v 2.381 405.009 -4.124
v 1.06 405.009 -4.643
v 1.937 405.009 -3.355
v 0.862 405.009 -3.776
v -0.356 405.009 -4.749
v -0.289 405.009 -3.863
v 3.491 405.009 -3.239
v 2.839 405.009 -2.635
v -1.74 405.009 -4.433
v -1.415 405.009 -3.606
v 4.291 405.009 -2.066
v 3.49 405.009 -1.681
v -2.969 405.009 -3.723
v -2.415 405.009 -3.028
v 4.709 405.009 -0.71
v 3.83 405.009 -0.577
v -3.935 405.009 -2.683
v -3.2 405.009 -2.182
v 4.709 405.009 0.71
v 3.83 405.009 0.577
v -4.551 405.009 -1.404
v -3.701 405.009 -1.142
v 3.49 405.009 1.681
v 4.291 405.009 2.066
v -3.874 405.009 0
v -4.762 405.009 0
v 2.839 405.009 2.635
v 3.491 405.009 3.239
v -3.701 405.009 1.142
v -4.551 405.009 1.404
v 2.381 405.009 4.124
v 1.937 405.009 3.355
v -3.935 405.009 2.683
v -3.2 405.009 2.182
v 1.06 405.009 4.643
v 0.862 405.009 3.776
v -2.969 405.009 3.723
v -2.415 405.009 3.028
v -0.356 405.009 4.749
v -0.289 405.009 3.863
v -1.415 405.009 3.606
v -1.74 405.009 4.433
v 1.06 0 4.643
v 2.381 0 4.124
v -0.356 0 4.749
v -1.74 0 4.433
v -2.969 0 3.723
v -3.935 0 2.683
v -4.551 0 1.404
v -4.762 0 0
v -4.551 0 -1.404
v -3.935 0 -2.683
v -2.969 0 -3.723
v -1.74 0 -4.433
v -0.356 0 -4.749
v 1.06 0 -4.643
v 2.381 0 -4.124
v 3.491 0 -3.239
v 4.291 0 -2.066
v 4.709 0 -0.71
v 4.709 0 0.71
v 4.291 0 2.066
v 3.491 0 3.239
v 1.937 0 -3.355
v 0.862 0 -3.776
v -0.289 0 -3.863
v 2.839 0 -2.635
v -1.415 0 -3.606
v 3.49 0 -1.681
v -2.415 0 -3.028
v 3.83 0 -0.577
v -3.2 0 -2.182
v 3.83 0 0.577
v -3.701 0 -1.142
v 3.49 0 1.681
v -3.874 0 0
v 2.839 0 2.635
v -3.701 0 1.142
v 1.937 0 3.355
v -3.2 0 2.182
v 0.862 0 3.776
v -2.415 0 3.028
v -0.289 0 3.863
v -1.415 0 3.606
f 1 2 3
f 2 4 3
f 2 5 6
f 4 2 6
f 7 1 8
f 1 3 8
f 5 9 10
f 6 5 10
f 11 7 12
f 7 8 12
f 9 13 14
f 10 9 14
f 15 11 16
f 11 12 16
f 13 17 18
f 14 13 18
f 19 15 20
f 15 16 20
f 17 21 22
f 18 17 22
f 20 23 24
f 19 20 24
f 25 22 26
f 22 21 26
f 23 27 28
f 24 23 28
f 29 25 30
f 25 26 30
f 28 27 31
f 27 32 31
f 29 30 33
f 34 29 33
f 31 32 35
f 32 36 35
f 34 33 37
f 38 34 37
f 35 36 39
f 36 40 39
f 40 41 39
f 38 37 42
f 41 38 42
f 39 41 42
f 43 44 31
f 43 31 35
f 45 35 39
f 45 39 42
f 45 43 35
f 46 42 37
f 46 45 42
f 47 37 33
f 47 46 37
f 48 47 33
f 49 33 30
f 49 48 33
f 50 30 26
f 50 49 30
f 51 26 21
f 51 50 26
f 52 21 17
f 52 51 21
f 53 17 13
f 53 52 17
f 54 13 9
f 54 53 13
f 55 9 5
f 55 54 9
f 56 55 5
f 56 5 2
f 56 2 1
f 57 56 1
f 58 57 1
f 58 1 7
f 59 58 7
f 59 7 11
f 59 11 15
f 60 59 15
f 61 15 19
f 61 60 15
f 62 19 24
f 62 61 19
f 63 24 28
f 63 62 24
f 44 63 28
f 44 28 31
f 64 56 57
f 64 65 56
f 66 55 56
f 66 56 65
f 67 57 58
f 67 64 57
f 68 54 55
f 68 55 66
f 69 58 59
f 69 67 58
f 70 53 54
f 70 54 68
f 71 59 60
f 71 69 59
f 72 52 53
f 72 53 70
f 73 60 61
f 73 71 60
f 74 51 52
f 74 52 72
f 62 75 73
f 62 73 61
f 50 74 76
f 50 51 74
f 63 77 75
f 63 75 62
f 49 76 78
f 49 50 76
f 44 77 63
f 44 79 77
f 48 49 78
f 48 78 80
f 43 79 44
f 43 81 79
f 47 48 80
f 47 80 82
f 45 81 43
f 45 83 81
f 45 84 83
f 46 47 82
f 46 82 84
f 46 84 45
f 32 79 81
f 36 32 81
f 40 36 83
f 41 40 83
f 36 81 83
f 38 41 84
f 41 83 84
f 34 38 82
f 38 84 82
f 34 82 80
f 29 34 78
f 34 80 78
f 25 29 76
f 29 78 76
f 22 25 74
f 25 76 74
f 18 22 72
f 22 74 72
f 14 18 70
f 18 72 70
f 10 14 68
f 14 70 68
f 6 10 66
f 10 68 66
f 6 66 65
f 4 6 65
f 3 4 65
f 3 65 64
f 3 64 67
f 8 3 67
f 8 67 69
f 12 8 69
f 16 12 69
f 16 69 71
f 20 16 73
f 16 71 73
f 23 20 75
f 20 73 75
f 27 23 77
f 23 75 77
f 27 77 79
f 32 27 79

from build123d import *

# Parameters (mm, degrees)
F0_R     = 4.7625
F0_R_2   = 3.8735
F1_DEPTH = 405.008555
F2_ANGLE = 30
F3_ANGLE = 30


with BuildPart() as f1:
    # F0 (on Front) → F1 (new body)
    with BuildSketch(Plane.XZ):
        Circle(F0_R)
        Circle(F0_R_2, mode=Mode.SUBTRACT)
    extrude(amount=-F1_DEPTH)


with BuildPart() as f1_1:
    # F2: moved
    add(f1.part.rotate(Axis((0, 0, 0), (0, -1, 0)), F2_ANGLE))


with BuildPart() as f1_2:
    # F3: moved
    add(f1_1.part.rotate(Axis((0, 0, 0), (0, -1, 0)), F3_ANGLE))


solid = f1_2.part
